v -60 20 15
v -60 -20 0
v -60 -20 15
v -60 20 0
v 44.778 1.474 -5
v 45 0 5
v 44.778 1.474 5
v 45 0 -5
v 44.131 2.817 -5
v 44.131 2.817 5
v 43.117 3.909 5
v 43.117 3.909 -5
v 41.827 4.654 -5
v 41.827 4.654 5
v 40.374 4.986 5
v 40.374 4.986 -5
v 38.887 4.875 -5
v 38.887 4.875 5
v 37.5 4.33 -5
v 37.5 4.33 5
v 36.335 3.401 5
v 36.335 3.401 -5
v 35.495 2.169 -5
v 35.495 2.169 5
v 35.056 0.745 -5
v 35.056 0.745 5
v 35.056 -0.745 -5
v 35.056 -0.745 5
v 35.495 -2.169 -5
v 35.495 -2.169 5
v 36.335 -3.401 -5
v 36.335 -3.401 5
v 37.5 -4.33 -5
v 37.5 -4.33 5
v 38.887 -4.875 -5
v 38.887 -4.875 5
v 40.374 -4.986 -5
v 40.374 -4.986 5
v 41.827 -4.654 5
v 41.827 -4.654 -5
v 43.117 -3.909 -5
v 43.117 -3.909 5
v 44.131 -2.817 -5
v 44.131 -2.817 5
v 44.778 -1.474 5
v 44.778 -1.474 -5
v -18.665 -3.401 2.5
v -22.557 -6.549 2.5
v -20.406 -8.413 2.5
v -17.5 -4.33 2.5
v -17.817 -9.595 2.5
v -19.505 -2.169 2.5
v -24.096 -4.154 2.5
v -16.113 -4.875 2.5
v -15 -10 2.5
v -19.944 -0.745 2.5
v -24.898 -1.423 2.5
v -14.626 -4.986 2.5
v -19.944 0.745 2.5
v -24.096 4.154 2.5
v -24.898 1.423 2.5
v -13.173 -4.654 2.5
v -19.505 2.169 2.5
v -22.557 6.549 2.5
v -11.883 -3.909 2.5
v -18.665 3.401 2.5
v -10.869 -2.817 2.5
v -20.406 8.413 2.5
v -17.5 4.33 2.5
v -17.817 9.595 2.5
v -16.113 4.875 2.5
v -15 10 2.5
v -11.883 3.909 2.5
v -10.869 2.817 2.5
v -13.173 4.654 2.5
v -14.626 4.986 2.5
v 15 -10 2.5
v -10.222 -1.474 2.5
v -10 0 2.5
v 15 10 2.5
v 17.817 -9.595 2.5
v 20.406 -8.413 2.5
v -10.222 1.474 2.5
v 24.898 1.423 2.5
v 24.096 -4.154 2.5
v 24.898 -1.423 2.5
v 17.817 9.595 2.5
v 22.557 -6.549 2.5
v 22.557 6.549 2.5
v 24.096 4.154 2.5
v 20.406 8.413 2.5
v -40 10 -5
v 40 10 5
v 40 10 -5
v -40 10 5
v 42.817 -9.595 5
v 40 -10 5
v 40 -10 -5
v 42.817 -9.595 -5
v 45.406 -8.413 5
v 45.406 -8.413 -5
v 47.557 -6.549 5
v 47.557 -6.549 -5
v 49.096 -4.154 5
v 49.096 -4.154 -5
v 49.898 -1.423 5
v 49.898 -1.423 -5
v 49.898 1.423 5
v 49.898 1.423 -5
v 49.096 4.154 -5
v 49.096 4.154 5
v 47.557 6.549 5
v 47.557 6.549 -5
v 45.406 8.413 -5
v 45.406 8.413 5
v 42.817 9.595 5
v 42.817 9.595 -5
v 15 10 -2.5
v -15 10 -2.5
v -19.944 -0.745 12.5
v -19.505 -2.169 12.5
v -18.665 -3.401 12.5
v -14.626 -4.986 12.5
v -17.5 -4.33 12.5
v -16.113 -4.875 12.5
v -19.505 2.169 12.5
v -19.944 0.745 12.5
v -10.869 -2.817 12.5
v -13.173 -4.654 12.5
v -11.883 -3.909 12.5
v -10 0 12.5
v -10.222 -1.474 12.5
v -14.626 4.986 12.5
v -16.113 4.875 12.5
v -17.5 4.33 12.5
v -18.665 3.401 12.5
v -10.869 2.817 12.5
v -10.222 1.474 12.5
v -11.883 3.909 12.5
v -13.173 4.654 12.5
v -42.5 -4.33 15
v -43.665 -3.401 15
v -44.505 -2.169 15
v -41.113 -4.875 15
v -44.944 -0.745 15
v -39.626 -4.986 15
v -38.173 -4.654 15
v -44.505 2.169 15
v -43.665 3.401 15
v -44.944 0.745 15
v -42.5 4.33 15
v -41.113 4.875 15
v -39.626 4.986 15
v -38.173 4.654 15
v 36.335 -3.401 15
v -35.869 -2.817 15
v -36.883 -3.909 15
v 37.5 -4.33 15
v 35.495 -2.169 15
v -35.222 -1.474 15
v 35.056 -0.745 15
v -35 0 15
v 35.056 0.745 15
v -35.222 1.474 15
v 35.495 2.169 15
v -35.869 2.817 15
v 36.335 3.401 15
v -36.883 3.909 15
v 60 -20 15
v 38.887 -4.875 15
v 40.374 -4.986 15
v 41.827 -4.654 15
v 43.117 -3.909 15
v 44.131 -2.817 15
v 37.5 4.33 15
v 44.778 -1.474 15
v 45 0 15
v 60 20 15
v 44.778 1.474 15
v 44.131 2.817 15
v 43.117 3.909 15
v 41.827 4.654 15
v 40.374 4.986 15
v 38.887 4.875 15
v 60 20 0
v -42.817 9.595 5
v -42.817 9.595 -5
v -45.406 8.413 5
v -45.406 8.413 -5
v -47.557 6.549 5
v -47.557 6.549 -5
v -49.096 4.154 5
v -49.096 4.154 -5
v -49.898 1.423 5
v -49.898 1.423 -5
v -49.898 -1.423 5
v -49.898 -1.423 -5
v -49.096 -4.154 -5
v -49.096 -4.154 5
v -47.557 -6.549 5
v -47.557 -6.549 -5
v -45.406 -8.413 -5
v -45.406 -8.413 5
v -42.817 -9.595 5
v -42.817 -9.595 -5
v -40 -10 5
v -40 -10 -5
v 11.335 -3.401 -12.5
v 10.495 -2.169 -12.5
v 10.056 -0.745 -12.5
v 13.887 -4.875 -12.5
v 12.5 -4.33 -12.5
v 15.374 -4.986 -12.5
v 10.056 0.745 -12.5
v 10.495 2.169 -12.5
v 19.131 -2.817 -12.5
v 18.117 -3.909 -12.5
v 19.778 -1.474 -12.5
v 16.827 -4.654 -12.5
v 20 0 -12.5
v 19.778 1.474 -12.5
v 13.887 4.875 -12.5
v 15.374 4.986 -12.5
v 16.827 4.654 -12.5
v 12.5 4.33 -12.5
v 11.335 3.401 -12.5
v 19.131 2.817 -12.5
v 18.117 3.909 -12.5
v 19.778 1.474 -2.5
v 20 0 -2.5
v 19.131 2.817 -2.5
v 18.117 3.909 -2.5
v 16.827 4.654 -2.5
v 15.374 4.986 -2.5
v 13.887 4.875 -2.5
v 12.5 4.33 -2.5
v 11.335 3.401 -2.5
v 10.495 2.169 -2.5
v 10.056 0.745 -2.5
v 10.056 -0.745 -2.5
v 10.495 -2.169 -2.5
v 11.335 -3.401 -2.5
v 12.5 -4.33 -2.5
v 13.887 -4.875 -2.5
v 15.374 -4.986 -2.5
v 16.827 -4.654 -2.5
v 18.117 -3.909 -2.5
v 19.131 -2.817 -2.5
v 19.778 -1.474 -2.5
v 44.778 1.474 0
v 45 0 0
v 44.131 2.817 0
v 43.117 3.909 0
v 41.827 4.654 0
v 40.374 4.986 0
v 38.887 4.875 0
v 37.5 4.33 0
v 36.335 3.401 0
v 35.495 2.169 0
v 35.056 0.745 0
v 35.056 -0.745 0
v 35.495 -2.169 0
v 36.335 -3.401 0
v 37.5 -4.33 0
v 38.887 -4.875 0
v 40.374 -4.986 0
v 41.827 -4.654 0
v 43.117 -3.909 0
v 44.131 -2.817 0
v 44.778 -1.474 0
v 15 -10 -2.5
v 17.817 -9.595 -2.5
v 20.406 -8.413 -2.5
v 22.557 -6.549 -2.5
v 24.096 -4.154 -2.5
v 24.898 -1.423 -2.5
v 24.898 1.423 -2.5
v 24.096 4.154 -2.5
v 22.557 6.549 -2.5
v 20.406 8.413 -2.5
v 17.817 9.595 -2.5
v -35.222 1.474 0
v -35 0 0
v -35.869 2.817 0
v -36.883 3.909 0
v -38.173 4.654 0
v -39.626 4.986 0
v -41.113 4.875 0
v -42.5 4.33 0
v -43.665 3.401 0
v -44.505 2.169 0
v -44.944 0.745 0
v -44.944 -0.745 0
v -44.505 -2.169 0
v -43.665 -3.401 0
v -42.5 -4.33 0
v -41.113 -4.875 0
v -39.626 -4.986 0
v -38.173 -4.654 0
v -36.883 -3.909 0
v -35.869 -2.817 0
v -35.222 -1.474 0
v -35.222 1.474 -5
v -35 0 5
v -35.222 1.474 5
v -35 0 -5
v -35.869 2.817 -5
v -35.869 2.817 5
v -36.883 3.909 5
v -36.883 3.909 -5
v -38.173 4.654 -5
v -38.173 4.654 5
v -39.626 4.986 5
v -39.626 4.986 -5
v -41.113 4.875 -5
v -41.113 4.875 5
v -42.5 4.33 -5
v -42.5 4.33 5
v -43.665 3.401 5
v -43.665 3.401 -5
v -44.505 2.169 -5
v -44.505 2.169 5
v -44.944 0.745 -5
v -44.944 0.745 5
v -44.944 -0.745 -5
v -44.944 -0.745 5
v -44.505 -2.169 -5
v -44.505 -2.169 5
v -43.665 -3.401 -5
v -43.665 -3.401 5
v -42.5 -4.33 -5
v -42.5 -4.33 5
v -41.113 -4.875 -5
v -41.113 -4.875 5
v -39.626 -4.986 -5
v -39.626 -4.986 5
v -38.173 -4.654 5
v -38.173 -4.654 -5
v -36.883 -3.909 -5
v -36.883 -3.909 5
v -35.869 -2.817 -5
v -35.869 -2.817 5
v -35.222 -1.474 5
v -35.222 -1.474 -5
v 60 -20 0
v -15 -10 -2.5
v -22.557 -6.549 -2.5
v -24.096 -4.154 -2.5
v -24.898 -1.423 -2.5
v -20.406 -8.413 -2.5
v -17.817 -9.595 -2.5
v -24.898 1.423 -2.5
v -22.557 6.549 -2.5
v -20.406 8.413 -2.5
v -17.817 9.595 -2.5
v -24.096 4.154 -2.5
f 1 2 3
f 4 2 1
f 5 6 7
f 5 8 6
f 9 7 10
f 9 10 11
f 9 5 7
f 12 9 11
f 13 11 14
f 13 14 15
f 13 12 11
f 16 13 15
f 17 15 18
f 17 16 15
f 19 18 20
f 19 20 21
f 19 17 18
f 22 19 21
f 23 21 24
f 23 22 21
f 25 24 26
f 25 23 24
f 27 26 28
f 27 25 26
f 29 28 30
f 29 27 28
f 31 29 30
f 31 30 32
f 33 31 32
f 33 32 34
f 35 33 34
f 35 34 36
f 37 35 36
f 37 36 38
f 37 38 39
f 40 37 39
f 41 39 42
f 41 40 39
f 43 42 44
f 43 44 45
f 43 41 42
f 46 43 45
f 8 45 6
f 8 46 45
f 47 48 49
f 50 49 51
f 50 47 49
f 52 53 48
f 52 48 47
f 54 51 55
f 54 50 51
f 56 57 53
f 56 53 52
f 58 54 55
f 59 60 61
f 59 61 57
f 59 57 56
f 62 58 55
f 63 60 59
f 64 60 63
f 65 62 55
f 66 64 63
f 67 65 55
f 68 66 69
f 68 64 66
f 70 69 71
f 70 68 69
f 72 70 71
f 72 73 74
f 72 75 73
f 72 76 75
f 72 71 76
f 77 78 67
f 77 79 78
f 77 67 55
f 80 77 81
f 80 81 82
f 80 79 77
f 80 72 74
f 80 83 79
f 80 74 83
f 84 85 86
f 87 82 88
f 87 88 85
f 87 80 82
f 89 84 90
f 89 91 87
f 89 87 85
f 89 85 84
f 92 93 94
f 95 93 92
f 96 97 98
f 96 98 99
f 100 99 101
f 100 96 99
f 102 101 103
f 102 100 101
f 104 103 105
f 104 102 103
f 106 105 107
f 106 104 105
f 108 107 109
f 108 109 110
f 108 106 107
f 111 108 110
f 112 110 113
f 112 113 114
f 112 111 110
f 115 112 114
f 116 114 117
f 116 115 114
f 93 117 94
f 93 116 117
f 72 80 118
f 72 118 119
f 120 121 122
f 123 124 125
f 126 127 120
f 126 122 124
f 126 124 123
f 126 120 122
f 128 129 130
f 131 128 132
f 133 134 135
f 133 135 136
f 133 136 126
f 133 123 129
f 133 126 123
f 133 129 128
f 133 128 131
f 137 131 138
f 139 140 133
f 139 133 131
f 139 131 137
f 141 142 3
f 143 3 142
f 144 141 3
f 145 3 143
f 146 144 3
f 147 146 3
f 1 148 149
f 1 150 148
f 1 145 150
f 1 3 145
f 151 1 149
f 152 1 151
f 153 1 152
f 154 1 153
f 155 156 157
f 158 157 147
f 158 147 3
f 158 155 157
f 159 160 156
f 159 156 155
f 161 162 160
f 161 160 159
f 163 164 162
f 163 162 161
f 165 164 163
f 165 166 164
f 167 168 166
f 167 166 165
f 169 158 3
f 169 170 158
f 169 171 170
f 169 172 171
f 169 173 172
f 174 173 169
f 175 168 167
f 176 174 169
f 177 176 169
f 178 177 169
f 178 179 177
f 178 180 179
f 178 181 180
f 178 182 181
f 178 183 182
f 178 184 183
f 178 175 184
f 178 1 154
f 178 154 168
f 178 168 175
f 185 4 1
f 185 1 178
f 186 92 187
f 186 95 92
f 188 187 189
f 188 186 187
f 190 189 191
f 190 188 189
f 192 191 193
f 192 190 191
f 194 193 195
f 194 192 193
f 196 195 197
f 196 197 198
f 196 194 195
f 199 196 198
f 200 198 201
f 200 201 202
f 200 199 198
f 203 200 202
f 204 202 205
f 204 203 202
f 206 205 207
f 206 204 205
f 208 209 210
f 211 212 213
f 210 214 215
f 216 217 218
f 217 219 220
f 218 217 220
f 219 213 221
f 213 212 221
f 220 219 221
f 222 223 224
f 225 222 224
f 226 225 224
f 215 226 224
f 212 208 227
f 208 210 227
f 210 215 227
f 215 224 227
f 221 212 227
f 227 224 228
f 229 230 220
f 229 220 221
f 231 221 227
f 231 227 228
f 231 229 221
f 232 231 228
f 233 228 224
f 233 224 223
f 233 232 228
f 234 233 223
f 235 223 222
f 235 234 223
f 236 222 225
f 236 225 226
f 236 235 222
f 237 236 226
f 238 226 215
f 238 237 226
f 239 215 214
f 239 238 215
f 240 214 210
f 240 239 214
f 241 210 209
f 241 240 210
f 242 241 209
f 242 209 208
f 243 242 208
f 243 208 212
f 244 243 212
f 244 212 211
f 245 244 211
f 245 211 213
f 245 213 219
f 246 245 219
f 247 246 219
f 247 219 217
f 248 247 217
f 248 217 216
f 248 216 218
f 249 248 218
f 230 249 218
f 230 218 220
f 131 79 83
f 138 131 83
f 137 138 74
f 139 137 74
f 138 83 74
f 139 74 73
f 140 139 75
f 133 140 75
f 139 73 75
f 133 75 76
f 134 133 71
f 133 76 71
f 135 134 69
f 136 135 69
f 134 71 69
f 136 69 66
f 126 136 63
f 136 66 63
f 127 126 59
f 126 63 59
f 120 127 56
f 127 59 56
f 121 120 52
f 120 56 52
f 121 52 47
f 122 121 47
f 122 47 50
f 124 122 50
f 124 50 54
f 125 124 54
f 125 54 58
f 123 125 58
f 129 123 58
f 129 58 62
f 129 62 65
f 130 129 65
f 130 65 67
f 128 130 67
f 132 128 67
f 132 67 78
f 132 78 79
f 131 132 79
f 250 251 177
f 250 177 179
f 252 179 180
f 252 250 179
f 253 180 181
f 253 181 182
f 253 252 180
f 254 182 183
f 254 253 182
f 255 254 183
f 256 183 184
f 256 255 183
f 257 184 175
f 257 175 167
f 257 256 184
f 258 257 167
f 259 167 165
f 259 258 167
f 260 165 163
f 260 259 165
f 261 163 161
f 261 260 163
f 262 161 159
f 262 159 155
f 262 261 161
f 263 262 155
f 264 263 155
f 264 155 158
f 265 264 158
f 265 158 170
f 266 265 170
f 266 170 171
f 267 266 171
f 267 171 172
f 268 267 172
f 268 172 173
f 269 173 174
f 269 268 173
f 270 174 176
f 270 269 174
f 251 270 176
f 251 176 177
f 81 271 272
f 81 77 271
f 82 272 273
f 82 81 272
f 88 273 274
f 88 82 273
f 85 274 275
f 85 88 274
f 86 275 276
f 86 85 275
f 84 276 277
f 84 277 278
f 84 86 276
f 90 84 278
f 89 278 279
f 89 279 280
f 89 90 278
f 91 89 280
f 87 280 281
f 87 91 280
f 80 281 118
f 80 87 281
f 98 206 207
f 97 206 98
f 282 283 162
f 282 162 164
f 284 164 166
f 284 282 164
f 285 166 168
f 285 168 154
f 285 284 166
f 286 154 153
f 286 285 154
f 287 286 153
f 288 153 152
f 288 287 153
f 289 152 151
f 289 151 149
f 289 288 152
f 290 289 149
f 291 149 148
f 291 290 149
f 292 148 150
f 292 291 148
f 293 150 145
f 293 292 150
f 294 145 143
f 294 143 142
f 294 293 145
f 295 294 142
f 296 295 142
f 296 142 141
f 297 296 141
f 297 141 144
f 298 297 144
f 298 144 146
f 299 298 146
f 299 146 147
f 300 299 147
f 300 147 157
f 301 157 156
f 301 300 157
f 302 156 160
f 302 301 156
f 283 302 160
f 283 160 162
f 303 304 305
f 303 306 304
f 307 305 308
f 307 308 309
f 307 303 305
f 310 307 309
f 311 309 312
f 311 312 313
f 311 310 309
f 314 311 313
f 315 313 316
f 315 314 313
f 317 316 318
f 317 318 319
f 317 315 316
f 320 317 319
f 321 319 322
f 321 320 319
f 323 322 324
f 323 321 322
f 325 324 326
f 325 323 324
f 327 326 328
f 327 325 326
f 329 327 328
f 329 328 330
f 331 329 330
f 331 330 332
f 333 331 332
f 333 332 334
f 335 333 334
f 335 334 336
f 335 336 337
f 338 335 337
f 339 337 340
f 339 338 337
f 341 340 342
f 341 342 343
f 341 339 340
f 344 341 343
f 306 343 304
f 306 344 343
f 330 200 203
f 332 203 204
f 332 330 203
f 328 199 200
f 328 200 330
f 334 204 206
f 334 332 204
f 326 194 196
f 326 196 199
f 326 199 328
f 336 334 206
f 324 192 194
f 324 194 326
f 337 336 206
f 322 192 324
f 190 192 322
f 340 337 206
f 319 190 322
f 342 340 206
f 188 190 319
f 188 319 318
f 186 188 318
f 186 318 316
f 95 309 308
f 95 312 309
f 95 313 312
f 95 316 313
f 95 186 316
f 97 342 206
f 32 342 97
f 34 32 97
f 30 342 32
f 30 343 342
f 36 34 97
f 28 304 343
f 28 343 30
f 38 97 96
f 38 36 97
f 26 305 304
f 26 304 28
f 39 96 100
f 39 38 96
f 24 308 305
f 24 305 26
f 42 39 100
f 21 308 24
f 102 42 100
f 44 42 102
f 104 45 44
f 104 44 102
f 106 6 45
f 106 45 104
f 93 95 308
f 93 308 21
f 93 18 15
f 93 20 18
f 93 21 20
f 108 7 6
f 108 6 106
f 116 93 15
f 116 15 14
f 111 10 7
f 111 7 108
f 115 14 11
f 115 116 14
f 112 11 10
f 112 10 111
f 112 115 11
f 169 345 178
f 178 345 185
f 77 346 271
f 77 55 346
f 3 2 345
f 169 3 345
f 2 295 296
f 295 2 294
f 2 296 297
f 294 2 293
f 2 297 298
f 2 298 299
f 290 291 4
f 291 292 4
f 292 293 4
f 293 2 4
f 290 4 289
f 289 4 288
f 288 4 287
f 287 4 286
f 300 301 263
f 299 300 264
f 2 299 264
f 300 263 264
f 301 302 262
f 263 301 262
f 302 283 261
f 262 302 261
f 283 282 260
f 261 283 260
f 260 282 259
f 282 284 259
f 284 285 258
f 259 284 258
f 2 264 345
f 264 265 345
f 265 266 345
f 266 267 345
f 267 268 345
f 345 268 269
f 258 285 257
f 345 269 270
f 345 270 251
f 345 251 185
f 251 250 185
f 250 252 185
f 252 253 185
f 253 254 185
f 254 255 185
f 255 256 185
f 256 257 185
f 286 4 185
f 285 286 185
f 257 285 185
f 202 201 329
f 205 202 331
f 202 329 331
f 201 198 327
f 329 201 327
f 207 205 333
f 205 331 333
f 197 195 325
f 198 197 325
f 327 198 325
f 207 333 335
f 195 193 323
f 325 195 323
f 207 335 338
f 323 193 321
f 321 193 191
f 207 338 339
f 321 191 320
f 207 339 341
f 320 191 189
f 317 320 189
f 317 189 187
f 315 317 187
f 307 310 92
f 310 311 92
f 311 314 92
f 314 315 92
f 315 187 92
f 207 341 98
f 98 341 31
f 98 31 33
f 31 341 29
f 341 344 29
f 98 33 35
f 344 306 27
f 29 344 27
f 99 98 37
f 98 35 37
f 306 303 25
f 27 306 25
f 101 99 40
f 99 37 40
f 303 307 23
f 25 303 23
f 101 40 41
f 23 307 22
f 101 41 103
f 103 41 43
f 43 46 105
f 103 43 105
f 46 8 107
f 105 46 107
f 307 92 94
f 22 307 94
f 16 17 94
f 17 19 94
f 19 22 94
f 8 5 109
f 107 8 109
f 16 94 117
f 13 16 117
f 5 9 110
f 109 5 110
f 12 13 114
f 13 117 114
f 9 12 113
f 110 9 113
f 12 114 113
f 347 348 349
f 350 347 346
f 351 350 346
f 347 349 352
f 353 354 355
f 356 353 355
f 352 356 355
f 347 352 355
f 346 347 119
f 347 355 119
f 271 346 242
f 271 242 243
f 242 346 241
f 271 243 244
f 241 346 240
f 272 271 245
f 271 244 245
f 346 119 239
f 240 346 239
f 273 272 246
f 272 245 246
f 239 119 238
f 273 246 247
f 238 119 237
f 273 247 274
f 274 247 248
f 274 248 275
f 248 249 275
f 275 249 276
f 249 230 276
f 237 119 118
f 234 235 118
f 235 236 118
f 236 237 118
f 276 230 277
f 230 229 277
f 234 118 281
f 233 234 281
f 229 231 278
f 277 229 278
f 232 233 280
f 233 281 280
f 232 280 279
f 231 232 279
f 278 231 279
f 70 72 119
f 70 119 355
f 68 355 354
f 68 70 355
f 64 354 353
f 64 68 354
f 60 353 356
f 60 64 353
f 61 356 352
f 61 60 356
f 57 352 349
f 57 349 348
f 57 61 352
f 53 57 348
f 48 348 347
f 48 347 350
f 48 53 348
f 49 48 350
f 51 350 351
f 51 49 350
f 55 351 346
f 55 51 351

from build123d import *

# Parameters (mm, degrees)
F0_W          = 120
F0_H          = 40
F0_R          = 5
F1_DEPTH      = 15
F2_R          = 5
F3_DEPTH      = 2.5
F4_DEPTH      = 12.5
F4_DEPTH_BACK = 2.5
F5_DEPTH      = 2.5
F5_DEPTH_BACK = 12.5
F6_R          = 5
F7_DEPTH      = 5


with BuildPart() as f1:
    # F0 (on Top) → F1 (new body)
    with BuildSketch(Plane.XY):
        Rectangle(F0_W, F0_H)
        with Locations((-40, 0)):
            Circle(F0_R, mode=Mode.SUBTRACT)
        with Locations((40, 0)):
            Circle(F0_R, mode=Mode.SUBTRACT)
    extrude(amount=F1_DEPTH)


with BuildPart() as f3:
    # F2 (on Top) → F3 (new body, symmetric)
    with BuildSketch(Plane.XY):
        with BuildLine():
            ThreePointArc((15, -10), (25, 0), (15, 10))
            Line((15, 10), (-15, 10))
            ThreePointArc((-15, 10), (-25, 0), (-15, -10))
            Line((-15, -10), (15, -10))
        make_face()
        with Locations((-15, 0)):
            Circle(F2_R, mode=Mode.SUBTRACT)
        with Locations((15, 0)):
            Circle(F2_R, mode=Mode.SUBTRACT)
    extrude(amount=F3_DEPTH, both=True)

    # F2 (on Top) → F4 (join, two sides)
    with BuildSketch(Plane.XY) as f4_sk:
        with Locations((-15, 0)):
            Circle(F2_R)
    extrude(amount=F4_DEPTH)
    extrude(f4_sk.sketch, amount=-F4_DEPTH_BACK)

    # F2 (on Top) → F5 (join, two sides)
    with BuildSketch(Plane.XY) as f5_sk:
        with Locations((15, 0)):
            Circle(F2_R)
    extrude(amount=F5_DEPTH)
    extrude(f5_sk.sketch, amount=-F5_DEPTH_BACK)


with BuildPart() as f7:
    # F6 (on Top) → F7 (new body, symmetric)
    with BuildSketch(Plane.XY):
        with BuildLine():
            Line((-40, -10), (40, -10))
            ThreePointArc((40, -10), (50, 0), (40, 10))
            Line((40, 10), (-40, 10))
            ThreePointArc((-40, 10), (-50, 0), (-40, -10))
        make_face()
        with Locations((-40, 0)):
            Circle(F6_R, mode=Mode.SUBTRACT)
        with Locations((40, 0)):
            Circle(F6_R, mode=Mode.SUBTRACT)
    extrude(amount=F7_DEPTH, both=True)


solid = Compound([f1.part, f3.part, f7.part])
